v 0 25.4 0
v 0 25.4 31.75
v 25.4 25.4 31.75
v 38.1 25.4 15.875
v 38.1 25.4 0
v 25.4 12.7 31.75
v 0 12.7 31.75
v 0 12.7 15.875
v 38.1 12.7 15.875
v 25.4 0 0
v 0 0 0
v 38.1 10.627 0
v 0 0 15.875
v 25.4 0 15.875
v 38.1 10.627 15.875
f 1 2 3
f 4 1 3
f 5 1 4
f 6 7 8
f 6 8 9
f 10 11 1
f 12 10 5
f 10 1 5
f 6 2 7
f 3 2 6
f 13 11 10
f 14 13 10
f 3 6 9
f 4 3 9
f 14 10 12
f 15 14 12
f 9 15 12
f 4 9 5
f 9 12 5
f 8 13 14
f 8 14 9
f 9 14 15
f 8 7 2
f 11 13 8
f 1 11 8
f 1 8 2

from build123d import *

# Parameters (mm, degrees)
F0_W     = 38.1
F0_H     = 25.4
F1_DEPTH = 31.75
F2_W     = 38.1
F2_H     = 15.875
F3_DEPTH = 12.7
F5_DEPTH = 25.4
F7_DEPTH = 25.4


with BuildPart() as f1:
    # F0 (on Top) → F1 (new body)
    with BuildSketch(Plane.XY):
        with Locations((19.05, 12.7)):
            Rectangle(F0_W, F0_H)
    extrude(amount=F1_DEPTH)

    # F2 (on face) → F3 (cut)
    with BuildSketch(Plane.XZ):
        with Locations((19.05, 23.8125)):
            Rectangle(F2_W, F2_H)
    extrude(amount=-F3_DEPTH, mode=Mode.SUBTRACT)

    # F4 (on face) → F5 (cut)
    with BuildSketch(Plane.XZ.offset(-12.7)):
        Polygon((38.1, 15.875), (38.1, 31.75), (25.4, 31.75), align=None)
    extrude(amount=-F5_DEPTH, mode=Mode.SUBTRACT)

    # F6 (on face) → F7 (cut)
    with BuildSketch(Plane(origin=(0, 0, 0), x_dir=(1, 0, 0), z_dir=(0, 0, -1))):
        Polygon((38.1, -10.627423), (38.1, 0), (25.4, 0), align=None)
    extrude(amount=-F7_DEPTH, mode=Mode.SUBTRACT)


solid = f1.part
